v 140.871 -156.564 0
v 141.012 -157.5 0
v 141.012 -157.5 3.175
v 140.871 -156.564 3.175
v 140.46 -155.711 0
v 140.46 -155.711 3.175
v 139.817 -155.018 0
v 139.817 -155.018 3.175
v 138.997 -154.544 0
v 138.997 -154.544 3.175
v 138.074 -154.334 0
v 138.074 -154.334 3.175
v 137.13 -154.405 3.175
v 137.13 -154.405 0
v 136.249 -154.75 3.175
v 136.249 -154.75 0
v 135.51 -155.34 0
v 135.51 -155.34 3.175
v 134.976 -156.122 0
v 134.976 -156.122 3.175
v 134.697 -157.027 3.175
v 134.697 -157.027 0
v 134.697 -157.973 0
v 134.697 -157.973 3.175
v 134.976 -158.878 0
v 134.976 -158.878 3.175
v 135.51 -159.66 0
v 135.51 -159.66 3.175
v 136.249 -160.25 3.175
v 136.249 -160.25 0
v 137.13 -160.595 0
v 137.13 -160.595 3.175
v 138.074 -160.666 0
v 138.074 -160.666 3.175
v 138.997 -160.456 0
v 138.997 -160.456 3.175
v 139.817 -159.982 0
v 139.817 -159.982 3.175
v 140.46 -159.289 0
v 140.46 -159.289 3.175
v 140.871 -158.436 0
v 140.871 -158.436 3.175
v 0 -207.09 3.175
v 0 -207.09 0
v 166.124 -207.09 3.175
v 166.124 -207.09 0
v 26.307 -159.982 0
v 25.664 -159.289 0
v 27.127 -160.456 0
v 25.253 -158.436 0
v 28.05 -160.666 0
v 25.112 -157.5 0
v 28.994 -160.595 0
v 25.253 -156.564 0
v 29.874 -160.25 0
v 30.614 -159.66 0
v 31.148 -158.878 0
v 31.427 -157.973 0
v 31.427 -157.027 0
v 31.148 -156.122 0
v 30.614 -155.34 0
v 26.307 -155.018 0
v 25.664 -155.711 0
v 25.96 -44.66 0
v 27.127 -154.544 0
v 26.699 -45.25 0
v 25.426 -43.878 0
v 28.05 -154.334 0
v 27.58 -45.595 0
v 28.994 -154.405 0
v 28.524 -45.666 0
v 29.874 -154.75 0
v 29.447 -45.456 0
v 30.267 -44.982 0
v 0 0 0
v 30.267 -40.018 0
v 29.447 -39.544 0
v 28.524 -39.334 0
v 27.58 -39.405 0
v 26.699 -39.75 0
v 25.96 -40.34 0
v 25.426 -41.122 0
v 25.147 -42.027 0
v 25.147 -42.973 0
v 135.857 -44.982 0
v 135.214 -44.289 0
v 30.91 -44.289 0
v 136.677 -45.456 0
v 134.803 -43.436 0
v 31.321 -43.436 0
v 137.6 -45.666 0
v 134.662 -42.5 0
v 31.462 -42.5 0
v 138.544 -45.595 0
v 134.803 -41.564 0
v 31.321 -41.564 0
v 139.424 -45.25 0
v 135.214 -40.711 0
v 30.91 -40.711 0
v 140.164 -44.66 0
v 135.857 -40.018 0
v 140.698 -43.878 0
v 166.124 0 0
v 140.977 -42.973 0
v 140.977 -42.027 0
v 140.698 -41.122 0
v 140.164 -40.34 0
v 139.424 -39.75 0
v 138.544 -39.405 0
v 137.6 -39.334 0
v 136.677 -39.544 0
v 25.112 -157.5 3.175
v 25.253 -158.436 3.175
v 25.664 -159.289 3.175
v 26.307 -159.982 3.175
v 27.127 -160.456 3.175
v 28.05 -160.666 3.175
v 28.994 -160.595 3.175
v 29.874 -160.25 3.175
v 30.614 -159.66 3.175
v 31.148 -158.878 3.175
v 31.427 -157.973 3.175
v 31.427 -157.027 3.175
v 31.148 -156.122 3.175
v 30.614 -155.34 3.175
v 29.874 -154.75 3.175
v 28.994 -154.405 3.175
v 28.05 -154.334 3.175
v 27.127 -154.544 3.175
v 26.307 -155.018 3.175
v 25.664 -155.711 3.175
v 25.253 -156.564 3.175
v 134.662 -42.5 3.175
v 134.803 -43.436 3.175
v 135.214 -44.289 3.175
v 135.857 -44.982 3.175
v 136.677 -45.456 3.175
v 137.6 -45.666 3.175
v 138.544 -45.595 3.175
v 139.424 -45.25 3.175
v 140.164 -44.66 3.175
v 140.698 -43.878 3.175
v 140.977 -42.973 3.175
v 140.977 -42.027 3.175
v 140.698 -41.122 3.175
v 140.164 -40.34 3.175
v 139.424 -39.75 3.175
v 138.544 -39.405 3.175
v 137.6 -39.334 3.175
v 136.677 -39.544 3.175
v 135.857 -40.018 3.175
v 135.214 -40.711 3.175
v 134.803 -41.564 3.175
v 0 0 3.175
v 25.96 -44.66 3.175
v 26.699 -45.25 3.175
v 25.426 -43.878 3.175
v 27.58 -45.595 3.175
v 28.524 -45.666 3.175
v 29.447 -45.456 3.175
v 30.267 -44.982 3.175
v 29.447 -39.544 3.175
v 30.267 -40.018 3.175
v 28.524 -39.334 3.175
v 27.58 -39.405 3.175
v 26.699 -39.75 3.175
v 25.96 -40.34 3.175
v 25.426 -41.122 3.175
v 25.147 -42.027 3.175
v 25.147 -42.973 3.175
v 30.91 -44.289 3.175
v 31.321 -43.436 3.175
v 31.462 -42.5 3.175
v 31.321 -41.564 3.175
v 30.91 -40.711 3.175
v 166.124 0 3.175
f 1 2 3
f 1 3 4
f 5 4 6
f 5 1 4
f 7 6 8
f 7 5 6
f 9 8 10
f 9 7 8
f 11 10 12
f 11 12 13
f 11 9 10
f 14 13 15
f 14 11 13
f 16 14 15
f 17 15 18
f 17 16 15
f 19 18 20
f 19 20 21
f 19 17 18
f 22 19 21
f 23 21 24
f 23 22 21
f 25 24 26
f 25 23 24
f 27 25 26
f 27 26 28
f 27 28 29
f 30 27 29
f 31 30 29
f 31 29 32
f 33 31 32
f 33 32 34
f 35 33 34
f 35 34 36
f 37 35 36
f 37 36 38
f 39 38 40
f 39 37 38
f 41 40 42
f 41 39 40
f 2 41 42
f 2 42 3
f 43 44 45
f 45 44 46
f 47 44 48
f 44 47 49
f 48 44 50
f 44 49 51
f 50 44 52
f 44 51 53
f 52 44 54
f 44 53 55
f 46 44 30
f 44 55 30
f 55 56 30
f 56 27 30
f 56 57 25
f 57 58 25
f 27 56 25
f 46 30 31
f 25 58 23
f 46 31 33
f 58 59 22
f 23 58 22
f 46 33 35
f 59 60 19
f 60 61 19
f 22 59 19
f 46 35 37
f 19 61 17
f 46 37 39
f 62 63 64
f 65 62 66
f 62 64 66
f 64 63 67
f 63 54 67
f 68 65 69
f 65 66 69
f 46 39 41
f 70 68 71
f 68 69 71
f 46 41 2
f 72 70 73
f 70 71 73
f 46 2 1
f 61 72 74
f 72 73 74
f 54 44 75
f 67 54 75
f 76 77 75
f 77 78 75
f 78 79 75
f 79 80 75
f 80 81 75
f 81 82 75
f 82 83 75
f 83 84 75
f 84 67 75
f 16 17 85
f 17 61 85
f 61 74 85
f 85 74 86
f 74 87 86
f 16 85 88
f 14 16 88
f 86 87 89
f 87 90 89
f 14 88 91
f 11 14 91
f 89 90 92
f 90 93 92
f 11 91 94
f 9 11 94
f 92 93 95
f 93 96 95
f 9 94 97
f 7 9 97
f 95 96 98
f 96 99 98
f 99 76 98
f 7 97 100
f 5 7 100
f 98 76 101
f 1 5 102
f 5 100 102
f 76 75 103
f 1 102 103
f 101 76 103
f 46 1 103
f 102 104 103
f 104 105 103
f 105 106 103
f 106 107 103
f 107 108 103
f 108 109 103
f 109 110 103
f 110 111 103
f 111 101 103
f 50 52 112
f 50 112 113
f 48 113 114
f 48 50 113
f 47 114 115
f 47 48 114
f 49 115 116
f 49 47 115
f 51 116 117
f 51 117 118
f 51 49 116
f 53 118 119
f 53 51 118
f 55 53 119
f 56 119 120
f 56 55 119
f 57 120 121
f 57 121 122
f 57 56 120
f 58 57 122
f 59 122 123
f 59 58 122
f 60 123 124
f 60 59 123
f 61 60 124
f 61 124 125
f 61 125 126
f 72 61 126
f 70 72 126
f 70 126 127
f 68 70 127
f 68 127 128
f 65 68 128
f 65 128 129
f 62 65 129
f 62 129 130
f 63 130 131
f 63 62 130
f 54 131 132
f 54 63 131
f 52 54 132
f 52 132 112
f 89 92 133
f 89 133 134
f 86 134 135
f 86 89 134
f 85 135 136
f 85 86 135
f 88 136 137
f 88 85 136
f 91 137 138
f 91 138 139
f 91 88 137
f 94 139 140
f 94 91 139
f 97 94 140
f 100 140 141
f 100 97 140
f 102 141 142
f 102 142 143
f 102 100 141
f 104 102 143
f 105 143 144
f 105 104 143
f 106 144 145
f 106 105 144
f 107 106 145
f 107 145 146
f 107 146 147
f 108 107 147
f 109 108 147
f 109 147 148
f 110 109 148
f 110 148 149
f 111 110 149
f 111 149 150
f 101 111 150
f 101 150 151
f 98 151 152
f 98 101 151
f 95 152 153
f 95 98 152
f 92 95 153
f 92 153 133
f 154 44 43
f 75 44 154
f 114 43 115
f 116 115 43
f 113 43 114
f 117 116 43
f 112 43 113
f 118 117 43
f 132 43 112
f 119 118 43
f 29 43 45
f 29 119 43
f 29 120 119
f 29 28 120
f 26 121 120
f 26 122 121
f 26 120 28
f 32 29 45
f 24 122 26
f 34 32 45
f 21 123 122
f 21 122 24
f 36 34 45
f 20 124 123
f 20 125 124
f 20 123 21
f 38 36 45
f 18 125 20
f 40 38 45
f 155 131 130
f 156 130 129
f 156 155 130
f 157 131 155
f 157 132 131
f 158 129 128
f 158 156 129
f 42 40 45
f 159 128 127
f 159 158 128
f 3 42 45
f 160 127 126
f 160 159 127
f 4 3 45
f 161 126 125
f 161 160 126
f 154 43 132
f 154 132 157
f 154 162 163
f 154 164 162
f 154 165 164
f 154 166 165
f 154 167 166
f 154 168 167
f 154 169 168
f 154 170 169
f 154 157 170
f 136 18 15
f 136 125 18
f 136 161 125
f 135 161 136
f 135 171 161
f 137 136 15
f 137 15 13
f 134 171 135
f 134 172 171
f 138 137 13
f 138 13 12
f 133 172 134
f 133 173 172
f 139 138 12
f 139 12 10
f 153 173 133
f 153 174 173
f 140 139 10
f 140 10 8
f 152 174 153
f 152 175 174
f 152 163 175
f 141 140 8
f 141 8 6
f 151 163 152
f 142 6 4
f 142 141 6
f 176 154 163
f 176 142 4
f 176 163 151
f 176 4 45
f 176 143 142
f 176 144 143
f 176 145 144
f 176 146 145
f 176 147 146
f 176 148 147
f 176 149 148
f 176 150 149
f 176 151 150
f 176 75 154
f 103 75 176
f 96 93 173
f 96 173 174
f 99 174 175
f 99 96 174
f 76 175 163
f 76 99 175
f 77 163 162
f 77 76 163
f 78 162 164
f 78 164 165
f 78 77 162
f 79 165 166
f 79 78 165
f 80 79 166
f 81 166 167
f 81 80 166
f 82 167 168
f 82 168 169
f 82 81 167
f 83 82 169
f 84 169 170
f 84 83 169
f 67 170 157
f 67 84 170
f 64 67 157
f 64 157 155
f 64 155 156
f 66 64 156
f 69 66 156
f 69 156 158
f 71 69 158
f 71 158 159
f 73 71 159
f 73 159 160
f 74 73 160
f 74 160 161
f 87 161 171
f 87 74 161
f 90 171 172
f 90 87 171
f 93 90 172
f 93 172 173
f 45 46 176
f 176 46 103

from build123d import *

# Parameters (mm, degrees)
SKETCH1_W           = 166.124
SKETCH1_H           = 207.09
SKETCH1_R           = 3.175
BOSS_EXTRUDE1_DEPTH = 3.175


with BuildPart() as part:
    # Sketch1 → Boss-Extrude1 (new body)
    with BuildSketch(Plane.XY):
        with Locations((83.062, -103.545)):
            Rectangle(SKETCH1_W, SKETCH1_H)
        with Locations((28.287, -42.5)):
            Circle(SKETCH1_R, mode=Mode.SUBTRACT)
        with Locations(Location((137.837, -42.5, 0), (0, 0, 180))):
            Circle(SKETCH1_R, mode=Mode.SUBTRACT)
        with Locations(Location((28.287, -157.5, 0), (0, 0, 180))):
            Circle(SKETCH1_R, mode=Mode.SUBTRACT)
        with Locations((137.837, -157.5)):
            Circle(SKETCH1_R, mode=Mode.SUBTRACT)
    extrude(amount=BOSS_EXTRUDE1_DEPTH)


solid = part.part
